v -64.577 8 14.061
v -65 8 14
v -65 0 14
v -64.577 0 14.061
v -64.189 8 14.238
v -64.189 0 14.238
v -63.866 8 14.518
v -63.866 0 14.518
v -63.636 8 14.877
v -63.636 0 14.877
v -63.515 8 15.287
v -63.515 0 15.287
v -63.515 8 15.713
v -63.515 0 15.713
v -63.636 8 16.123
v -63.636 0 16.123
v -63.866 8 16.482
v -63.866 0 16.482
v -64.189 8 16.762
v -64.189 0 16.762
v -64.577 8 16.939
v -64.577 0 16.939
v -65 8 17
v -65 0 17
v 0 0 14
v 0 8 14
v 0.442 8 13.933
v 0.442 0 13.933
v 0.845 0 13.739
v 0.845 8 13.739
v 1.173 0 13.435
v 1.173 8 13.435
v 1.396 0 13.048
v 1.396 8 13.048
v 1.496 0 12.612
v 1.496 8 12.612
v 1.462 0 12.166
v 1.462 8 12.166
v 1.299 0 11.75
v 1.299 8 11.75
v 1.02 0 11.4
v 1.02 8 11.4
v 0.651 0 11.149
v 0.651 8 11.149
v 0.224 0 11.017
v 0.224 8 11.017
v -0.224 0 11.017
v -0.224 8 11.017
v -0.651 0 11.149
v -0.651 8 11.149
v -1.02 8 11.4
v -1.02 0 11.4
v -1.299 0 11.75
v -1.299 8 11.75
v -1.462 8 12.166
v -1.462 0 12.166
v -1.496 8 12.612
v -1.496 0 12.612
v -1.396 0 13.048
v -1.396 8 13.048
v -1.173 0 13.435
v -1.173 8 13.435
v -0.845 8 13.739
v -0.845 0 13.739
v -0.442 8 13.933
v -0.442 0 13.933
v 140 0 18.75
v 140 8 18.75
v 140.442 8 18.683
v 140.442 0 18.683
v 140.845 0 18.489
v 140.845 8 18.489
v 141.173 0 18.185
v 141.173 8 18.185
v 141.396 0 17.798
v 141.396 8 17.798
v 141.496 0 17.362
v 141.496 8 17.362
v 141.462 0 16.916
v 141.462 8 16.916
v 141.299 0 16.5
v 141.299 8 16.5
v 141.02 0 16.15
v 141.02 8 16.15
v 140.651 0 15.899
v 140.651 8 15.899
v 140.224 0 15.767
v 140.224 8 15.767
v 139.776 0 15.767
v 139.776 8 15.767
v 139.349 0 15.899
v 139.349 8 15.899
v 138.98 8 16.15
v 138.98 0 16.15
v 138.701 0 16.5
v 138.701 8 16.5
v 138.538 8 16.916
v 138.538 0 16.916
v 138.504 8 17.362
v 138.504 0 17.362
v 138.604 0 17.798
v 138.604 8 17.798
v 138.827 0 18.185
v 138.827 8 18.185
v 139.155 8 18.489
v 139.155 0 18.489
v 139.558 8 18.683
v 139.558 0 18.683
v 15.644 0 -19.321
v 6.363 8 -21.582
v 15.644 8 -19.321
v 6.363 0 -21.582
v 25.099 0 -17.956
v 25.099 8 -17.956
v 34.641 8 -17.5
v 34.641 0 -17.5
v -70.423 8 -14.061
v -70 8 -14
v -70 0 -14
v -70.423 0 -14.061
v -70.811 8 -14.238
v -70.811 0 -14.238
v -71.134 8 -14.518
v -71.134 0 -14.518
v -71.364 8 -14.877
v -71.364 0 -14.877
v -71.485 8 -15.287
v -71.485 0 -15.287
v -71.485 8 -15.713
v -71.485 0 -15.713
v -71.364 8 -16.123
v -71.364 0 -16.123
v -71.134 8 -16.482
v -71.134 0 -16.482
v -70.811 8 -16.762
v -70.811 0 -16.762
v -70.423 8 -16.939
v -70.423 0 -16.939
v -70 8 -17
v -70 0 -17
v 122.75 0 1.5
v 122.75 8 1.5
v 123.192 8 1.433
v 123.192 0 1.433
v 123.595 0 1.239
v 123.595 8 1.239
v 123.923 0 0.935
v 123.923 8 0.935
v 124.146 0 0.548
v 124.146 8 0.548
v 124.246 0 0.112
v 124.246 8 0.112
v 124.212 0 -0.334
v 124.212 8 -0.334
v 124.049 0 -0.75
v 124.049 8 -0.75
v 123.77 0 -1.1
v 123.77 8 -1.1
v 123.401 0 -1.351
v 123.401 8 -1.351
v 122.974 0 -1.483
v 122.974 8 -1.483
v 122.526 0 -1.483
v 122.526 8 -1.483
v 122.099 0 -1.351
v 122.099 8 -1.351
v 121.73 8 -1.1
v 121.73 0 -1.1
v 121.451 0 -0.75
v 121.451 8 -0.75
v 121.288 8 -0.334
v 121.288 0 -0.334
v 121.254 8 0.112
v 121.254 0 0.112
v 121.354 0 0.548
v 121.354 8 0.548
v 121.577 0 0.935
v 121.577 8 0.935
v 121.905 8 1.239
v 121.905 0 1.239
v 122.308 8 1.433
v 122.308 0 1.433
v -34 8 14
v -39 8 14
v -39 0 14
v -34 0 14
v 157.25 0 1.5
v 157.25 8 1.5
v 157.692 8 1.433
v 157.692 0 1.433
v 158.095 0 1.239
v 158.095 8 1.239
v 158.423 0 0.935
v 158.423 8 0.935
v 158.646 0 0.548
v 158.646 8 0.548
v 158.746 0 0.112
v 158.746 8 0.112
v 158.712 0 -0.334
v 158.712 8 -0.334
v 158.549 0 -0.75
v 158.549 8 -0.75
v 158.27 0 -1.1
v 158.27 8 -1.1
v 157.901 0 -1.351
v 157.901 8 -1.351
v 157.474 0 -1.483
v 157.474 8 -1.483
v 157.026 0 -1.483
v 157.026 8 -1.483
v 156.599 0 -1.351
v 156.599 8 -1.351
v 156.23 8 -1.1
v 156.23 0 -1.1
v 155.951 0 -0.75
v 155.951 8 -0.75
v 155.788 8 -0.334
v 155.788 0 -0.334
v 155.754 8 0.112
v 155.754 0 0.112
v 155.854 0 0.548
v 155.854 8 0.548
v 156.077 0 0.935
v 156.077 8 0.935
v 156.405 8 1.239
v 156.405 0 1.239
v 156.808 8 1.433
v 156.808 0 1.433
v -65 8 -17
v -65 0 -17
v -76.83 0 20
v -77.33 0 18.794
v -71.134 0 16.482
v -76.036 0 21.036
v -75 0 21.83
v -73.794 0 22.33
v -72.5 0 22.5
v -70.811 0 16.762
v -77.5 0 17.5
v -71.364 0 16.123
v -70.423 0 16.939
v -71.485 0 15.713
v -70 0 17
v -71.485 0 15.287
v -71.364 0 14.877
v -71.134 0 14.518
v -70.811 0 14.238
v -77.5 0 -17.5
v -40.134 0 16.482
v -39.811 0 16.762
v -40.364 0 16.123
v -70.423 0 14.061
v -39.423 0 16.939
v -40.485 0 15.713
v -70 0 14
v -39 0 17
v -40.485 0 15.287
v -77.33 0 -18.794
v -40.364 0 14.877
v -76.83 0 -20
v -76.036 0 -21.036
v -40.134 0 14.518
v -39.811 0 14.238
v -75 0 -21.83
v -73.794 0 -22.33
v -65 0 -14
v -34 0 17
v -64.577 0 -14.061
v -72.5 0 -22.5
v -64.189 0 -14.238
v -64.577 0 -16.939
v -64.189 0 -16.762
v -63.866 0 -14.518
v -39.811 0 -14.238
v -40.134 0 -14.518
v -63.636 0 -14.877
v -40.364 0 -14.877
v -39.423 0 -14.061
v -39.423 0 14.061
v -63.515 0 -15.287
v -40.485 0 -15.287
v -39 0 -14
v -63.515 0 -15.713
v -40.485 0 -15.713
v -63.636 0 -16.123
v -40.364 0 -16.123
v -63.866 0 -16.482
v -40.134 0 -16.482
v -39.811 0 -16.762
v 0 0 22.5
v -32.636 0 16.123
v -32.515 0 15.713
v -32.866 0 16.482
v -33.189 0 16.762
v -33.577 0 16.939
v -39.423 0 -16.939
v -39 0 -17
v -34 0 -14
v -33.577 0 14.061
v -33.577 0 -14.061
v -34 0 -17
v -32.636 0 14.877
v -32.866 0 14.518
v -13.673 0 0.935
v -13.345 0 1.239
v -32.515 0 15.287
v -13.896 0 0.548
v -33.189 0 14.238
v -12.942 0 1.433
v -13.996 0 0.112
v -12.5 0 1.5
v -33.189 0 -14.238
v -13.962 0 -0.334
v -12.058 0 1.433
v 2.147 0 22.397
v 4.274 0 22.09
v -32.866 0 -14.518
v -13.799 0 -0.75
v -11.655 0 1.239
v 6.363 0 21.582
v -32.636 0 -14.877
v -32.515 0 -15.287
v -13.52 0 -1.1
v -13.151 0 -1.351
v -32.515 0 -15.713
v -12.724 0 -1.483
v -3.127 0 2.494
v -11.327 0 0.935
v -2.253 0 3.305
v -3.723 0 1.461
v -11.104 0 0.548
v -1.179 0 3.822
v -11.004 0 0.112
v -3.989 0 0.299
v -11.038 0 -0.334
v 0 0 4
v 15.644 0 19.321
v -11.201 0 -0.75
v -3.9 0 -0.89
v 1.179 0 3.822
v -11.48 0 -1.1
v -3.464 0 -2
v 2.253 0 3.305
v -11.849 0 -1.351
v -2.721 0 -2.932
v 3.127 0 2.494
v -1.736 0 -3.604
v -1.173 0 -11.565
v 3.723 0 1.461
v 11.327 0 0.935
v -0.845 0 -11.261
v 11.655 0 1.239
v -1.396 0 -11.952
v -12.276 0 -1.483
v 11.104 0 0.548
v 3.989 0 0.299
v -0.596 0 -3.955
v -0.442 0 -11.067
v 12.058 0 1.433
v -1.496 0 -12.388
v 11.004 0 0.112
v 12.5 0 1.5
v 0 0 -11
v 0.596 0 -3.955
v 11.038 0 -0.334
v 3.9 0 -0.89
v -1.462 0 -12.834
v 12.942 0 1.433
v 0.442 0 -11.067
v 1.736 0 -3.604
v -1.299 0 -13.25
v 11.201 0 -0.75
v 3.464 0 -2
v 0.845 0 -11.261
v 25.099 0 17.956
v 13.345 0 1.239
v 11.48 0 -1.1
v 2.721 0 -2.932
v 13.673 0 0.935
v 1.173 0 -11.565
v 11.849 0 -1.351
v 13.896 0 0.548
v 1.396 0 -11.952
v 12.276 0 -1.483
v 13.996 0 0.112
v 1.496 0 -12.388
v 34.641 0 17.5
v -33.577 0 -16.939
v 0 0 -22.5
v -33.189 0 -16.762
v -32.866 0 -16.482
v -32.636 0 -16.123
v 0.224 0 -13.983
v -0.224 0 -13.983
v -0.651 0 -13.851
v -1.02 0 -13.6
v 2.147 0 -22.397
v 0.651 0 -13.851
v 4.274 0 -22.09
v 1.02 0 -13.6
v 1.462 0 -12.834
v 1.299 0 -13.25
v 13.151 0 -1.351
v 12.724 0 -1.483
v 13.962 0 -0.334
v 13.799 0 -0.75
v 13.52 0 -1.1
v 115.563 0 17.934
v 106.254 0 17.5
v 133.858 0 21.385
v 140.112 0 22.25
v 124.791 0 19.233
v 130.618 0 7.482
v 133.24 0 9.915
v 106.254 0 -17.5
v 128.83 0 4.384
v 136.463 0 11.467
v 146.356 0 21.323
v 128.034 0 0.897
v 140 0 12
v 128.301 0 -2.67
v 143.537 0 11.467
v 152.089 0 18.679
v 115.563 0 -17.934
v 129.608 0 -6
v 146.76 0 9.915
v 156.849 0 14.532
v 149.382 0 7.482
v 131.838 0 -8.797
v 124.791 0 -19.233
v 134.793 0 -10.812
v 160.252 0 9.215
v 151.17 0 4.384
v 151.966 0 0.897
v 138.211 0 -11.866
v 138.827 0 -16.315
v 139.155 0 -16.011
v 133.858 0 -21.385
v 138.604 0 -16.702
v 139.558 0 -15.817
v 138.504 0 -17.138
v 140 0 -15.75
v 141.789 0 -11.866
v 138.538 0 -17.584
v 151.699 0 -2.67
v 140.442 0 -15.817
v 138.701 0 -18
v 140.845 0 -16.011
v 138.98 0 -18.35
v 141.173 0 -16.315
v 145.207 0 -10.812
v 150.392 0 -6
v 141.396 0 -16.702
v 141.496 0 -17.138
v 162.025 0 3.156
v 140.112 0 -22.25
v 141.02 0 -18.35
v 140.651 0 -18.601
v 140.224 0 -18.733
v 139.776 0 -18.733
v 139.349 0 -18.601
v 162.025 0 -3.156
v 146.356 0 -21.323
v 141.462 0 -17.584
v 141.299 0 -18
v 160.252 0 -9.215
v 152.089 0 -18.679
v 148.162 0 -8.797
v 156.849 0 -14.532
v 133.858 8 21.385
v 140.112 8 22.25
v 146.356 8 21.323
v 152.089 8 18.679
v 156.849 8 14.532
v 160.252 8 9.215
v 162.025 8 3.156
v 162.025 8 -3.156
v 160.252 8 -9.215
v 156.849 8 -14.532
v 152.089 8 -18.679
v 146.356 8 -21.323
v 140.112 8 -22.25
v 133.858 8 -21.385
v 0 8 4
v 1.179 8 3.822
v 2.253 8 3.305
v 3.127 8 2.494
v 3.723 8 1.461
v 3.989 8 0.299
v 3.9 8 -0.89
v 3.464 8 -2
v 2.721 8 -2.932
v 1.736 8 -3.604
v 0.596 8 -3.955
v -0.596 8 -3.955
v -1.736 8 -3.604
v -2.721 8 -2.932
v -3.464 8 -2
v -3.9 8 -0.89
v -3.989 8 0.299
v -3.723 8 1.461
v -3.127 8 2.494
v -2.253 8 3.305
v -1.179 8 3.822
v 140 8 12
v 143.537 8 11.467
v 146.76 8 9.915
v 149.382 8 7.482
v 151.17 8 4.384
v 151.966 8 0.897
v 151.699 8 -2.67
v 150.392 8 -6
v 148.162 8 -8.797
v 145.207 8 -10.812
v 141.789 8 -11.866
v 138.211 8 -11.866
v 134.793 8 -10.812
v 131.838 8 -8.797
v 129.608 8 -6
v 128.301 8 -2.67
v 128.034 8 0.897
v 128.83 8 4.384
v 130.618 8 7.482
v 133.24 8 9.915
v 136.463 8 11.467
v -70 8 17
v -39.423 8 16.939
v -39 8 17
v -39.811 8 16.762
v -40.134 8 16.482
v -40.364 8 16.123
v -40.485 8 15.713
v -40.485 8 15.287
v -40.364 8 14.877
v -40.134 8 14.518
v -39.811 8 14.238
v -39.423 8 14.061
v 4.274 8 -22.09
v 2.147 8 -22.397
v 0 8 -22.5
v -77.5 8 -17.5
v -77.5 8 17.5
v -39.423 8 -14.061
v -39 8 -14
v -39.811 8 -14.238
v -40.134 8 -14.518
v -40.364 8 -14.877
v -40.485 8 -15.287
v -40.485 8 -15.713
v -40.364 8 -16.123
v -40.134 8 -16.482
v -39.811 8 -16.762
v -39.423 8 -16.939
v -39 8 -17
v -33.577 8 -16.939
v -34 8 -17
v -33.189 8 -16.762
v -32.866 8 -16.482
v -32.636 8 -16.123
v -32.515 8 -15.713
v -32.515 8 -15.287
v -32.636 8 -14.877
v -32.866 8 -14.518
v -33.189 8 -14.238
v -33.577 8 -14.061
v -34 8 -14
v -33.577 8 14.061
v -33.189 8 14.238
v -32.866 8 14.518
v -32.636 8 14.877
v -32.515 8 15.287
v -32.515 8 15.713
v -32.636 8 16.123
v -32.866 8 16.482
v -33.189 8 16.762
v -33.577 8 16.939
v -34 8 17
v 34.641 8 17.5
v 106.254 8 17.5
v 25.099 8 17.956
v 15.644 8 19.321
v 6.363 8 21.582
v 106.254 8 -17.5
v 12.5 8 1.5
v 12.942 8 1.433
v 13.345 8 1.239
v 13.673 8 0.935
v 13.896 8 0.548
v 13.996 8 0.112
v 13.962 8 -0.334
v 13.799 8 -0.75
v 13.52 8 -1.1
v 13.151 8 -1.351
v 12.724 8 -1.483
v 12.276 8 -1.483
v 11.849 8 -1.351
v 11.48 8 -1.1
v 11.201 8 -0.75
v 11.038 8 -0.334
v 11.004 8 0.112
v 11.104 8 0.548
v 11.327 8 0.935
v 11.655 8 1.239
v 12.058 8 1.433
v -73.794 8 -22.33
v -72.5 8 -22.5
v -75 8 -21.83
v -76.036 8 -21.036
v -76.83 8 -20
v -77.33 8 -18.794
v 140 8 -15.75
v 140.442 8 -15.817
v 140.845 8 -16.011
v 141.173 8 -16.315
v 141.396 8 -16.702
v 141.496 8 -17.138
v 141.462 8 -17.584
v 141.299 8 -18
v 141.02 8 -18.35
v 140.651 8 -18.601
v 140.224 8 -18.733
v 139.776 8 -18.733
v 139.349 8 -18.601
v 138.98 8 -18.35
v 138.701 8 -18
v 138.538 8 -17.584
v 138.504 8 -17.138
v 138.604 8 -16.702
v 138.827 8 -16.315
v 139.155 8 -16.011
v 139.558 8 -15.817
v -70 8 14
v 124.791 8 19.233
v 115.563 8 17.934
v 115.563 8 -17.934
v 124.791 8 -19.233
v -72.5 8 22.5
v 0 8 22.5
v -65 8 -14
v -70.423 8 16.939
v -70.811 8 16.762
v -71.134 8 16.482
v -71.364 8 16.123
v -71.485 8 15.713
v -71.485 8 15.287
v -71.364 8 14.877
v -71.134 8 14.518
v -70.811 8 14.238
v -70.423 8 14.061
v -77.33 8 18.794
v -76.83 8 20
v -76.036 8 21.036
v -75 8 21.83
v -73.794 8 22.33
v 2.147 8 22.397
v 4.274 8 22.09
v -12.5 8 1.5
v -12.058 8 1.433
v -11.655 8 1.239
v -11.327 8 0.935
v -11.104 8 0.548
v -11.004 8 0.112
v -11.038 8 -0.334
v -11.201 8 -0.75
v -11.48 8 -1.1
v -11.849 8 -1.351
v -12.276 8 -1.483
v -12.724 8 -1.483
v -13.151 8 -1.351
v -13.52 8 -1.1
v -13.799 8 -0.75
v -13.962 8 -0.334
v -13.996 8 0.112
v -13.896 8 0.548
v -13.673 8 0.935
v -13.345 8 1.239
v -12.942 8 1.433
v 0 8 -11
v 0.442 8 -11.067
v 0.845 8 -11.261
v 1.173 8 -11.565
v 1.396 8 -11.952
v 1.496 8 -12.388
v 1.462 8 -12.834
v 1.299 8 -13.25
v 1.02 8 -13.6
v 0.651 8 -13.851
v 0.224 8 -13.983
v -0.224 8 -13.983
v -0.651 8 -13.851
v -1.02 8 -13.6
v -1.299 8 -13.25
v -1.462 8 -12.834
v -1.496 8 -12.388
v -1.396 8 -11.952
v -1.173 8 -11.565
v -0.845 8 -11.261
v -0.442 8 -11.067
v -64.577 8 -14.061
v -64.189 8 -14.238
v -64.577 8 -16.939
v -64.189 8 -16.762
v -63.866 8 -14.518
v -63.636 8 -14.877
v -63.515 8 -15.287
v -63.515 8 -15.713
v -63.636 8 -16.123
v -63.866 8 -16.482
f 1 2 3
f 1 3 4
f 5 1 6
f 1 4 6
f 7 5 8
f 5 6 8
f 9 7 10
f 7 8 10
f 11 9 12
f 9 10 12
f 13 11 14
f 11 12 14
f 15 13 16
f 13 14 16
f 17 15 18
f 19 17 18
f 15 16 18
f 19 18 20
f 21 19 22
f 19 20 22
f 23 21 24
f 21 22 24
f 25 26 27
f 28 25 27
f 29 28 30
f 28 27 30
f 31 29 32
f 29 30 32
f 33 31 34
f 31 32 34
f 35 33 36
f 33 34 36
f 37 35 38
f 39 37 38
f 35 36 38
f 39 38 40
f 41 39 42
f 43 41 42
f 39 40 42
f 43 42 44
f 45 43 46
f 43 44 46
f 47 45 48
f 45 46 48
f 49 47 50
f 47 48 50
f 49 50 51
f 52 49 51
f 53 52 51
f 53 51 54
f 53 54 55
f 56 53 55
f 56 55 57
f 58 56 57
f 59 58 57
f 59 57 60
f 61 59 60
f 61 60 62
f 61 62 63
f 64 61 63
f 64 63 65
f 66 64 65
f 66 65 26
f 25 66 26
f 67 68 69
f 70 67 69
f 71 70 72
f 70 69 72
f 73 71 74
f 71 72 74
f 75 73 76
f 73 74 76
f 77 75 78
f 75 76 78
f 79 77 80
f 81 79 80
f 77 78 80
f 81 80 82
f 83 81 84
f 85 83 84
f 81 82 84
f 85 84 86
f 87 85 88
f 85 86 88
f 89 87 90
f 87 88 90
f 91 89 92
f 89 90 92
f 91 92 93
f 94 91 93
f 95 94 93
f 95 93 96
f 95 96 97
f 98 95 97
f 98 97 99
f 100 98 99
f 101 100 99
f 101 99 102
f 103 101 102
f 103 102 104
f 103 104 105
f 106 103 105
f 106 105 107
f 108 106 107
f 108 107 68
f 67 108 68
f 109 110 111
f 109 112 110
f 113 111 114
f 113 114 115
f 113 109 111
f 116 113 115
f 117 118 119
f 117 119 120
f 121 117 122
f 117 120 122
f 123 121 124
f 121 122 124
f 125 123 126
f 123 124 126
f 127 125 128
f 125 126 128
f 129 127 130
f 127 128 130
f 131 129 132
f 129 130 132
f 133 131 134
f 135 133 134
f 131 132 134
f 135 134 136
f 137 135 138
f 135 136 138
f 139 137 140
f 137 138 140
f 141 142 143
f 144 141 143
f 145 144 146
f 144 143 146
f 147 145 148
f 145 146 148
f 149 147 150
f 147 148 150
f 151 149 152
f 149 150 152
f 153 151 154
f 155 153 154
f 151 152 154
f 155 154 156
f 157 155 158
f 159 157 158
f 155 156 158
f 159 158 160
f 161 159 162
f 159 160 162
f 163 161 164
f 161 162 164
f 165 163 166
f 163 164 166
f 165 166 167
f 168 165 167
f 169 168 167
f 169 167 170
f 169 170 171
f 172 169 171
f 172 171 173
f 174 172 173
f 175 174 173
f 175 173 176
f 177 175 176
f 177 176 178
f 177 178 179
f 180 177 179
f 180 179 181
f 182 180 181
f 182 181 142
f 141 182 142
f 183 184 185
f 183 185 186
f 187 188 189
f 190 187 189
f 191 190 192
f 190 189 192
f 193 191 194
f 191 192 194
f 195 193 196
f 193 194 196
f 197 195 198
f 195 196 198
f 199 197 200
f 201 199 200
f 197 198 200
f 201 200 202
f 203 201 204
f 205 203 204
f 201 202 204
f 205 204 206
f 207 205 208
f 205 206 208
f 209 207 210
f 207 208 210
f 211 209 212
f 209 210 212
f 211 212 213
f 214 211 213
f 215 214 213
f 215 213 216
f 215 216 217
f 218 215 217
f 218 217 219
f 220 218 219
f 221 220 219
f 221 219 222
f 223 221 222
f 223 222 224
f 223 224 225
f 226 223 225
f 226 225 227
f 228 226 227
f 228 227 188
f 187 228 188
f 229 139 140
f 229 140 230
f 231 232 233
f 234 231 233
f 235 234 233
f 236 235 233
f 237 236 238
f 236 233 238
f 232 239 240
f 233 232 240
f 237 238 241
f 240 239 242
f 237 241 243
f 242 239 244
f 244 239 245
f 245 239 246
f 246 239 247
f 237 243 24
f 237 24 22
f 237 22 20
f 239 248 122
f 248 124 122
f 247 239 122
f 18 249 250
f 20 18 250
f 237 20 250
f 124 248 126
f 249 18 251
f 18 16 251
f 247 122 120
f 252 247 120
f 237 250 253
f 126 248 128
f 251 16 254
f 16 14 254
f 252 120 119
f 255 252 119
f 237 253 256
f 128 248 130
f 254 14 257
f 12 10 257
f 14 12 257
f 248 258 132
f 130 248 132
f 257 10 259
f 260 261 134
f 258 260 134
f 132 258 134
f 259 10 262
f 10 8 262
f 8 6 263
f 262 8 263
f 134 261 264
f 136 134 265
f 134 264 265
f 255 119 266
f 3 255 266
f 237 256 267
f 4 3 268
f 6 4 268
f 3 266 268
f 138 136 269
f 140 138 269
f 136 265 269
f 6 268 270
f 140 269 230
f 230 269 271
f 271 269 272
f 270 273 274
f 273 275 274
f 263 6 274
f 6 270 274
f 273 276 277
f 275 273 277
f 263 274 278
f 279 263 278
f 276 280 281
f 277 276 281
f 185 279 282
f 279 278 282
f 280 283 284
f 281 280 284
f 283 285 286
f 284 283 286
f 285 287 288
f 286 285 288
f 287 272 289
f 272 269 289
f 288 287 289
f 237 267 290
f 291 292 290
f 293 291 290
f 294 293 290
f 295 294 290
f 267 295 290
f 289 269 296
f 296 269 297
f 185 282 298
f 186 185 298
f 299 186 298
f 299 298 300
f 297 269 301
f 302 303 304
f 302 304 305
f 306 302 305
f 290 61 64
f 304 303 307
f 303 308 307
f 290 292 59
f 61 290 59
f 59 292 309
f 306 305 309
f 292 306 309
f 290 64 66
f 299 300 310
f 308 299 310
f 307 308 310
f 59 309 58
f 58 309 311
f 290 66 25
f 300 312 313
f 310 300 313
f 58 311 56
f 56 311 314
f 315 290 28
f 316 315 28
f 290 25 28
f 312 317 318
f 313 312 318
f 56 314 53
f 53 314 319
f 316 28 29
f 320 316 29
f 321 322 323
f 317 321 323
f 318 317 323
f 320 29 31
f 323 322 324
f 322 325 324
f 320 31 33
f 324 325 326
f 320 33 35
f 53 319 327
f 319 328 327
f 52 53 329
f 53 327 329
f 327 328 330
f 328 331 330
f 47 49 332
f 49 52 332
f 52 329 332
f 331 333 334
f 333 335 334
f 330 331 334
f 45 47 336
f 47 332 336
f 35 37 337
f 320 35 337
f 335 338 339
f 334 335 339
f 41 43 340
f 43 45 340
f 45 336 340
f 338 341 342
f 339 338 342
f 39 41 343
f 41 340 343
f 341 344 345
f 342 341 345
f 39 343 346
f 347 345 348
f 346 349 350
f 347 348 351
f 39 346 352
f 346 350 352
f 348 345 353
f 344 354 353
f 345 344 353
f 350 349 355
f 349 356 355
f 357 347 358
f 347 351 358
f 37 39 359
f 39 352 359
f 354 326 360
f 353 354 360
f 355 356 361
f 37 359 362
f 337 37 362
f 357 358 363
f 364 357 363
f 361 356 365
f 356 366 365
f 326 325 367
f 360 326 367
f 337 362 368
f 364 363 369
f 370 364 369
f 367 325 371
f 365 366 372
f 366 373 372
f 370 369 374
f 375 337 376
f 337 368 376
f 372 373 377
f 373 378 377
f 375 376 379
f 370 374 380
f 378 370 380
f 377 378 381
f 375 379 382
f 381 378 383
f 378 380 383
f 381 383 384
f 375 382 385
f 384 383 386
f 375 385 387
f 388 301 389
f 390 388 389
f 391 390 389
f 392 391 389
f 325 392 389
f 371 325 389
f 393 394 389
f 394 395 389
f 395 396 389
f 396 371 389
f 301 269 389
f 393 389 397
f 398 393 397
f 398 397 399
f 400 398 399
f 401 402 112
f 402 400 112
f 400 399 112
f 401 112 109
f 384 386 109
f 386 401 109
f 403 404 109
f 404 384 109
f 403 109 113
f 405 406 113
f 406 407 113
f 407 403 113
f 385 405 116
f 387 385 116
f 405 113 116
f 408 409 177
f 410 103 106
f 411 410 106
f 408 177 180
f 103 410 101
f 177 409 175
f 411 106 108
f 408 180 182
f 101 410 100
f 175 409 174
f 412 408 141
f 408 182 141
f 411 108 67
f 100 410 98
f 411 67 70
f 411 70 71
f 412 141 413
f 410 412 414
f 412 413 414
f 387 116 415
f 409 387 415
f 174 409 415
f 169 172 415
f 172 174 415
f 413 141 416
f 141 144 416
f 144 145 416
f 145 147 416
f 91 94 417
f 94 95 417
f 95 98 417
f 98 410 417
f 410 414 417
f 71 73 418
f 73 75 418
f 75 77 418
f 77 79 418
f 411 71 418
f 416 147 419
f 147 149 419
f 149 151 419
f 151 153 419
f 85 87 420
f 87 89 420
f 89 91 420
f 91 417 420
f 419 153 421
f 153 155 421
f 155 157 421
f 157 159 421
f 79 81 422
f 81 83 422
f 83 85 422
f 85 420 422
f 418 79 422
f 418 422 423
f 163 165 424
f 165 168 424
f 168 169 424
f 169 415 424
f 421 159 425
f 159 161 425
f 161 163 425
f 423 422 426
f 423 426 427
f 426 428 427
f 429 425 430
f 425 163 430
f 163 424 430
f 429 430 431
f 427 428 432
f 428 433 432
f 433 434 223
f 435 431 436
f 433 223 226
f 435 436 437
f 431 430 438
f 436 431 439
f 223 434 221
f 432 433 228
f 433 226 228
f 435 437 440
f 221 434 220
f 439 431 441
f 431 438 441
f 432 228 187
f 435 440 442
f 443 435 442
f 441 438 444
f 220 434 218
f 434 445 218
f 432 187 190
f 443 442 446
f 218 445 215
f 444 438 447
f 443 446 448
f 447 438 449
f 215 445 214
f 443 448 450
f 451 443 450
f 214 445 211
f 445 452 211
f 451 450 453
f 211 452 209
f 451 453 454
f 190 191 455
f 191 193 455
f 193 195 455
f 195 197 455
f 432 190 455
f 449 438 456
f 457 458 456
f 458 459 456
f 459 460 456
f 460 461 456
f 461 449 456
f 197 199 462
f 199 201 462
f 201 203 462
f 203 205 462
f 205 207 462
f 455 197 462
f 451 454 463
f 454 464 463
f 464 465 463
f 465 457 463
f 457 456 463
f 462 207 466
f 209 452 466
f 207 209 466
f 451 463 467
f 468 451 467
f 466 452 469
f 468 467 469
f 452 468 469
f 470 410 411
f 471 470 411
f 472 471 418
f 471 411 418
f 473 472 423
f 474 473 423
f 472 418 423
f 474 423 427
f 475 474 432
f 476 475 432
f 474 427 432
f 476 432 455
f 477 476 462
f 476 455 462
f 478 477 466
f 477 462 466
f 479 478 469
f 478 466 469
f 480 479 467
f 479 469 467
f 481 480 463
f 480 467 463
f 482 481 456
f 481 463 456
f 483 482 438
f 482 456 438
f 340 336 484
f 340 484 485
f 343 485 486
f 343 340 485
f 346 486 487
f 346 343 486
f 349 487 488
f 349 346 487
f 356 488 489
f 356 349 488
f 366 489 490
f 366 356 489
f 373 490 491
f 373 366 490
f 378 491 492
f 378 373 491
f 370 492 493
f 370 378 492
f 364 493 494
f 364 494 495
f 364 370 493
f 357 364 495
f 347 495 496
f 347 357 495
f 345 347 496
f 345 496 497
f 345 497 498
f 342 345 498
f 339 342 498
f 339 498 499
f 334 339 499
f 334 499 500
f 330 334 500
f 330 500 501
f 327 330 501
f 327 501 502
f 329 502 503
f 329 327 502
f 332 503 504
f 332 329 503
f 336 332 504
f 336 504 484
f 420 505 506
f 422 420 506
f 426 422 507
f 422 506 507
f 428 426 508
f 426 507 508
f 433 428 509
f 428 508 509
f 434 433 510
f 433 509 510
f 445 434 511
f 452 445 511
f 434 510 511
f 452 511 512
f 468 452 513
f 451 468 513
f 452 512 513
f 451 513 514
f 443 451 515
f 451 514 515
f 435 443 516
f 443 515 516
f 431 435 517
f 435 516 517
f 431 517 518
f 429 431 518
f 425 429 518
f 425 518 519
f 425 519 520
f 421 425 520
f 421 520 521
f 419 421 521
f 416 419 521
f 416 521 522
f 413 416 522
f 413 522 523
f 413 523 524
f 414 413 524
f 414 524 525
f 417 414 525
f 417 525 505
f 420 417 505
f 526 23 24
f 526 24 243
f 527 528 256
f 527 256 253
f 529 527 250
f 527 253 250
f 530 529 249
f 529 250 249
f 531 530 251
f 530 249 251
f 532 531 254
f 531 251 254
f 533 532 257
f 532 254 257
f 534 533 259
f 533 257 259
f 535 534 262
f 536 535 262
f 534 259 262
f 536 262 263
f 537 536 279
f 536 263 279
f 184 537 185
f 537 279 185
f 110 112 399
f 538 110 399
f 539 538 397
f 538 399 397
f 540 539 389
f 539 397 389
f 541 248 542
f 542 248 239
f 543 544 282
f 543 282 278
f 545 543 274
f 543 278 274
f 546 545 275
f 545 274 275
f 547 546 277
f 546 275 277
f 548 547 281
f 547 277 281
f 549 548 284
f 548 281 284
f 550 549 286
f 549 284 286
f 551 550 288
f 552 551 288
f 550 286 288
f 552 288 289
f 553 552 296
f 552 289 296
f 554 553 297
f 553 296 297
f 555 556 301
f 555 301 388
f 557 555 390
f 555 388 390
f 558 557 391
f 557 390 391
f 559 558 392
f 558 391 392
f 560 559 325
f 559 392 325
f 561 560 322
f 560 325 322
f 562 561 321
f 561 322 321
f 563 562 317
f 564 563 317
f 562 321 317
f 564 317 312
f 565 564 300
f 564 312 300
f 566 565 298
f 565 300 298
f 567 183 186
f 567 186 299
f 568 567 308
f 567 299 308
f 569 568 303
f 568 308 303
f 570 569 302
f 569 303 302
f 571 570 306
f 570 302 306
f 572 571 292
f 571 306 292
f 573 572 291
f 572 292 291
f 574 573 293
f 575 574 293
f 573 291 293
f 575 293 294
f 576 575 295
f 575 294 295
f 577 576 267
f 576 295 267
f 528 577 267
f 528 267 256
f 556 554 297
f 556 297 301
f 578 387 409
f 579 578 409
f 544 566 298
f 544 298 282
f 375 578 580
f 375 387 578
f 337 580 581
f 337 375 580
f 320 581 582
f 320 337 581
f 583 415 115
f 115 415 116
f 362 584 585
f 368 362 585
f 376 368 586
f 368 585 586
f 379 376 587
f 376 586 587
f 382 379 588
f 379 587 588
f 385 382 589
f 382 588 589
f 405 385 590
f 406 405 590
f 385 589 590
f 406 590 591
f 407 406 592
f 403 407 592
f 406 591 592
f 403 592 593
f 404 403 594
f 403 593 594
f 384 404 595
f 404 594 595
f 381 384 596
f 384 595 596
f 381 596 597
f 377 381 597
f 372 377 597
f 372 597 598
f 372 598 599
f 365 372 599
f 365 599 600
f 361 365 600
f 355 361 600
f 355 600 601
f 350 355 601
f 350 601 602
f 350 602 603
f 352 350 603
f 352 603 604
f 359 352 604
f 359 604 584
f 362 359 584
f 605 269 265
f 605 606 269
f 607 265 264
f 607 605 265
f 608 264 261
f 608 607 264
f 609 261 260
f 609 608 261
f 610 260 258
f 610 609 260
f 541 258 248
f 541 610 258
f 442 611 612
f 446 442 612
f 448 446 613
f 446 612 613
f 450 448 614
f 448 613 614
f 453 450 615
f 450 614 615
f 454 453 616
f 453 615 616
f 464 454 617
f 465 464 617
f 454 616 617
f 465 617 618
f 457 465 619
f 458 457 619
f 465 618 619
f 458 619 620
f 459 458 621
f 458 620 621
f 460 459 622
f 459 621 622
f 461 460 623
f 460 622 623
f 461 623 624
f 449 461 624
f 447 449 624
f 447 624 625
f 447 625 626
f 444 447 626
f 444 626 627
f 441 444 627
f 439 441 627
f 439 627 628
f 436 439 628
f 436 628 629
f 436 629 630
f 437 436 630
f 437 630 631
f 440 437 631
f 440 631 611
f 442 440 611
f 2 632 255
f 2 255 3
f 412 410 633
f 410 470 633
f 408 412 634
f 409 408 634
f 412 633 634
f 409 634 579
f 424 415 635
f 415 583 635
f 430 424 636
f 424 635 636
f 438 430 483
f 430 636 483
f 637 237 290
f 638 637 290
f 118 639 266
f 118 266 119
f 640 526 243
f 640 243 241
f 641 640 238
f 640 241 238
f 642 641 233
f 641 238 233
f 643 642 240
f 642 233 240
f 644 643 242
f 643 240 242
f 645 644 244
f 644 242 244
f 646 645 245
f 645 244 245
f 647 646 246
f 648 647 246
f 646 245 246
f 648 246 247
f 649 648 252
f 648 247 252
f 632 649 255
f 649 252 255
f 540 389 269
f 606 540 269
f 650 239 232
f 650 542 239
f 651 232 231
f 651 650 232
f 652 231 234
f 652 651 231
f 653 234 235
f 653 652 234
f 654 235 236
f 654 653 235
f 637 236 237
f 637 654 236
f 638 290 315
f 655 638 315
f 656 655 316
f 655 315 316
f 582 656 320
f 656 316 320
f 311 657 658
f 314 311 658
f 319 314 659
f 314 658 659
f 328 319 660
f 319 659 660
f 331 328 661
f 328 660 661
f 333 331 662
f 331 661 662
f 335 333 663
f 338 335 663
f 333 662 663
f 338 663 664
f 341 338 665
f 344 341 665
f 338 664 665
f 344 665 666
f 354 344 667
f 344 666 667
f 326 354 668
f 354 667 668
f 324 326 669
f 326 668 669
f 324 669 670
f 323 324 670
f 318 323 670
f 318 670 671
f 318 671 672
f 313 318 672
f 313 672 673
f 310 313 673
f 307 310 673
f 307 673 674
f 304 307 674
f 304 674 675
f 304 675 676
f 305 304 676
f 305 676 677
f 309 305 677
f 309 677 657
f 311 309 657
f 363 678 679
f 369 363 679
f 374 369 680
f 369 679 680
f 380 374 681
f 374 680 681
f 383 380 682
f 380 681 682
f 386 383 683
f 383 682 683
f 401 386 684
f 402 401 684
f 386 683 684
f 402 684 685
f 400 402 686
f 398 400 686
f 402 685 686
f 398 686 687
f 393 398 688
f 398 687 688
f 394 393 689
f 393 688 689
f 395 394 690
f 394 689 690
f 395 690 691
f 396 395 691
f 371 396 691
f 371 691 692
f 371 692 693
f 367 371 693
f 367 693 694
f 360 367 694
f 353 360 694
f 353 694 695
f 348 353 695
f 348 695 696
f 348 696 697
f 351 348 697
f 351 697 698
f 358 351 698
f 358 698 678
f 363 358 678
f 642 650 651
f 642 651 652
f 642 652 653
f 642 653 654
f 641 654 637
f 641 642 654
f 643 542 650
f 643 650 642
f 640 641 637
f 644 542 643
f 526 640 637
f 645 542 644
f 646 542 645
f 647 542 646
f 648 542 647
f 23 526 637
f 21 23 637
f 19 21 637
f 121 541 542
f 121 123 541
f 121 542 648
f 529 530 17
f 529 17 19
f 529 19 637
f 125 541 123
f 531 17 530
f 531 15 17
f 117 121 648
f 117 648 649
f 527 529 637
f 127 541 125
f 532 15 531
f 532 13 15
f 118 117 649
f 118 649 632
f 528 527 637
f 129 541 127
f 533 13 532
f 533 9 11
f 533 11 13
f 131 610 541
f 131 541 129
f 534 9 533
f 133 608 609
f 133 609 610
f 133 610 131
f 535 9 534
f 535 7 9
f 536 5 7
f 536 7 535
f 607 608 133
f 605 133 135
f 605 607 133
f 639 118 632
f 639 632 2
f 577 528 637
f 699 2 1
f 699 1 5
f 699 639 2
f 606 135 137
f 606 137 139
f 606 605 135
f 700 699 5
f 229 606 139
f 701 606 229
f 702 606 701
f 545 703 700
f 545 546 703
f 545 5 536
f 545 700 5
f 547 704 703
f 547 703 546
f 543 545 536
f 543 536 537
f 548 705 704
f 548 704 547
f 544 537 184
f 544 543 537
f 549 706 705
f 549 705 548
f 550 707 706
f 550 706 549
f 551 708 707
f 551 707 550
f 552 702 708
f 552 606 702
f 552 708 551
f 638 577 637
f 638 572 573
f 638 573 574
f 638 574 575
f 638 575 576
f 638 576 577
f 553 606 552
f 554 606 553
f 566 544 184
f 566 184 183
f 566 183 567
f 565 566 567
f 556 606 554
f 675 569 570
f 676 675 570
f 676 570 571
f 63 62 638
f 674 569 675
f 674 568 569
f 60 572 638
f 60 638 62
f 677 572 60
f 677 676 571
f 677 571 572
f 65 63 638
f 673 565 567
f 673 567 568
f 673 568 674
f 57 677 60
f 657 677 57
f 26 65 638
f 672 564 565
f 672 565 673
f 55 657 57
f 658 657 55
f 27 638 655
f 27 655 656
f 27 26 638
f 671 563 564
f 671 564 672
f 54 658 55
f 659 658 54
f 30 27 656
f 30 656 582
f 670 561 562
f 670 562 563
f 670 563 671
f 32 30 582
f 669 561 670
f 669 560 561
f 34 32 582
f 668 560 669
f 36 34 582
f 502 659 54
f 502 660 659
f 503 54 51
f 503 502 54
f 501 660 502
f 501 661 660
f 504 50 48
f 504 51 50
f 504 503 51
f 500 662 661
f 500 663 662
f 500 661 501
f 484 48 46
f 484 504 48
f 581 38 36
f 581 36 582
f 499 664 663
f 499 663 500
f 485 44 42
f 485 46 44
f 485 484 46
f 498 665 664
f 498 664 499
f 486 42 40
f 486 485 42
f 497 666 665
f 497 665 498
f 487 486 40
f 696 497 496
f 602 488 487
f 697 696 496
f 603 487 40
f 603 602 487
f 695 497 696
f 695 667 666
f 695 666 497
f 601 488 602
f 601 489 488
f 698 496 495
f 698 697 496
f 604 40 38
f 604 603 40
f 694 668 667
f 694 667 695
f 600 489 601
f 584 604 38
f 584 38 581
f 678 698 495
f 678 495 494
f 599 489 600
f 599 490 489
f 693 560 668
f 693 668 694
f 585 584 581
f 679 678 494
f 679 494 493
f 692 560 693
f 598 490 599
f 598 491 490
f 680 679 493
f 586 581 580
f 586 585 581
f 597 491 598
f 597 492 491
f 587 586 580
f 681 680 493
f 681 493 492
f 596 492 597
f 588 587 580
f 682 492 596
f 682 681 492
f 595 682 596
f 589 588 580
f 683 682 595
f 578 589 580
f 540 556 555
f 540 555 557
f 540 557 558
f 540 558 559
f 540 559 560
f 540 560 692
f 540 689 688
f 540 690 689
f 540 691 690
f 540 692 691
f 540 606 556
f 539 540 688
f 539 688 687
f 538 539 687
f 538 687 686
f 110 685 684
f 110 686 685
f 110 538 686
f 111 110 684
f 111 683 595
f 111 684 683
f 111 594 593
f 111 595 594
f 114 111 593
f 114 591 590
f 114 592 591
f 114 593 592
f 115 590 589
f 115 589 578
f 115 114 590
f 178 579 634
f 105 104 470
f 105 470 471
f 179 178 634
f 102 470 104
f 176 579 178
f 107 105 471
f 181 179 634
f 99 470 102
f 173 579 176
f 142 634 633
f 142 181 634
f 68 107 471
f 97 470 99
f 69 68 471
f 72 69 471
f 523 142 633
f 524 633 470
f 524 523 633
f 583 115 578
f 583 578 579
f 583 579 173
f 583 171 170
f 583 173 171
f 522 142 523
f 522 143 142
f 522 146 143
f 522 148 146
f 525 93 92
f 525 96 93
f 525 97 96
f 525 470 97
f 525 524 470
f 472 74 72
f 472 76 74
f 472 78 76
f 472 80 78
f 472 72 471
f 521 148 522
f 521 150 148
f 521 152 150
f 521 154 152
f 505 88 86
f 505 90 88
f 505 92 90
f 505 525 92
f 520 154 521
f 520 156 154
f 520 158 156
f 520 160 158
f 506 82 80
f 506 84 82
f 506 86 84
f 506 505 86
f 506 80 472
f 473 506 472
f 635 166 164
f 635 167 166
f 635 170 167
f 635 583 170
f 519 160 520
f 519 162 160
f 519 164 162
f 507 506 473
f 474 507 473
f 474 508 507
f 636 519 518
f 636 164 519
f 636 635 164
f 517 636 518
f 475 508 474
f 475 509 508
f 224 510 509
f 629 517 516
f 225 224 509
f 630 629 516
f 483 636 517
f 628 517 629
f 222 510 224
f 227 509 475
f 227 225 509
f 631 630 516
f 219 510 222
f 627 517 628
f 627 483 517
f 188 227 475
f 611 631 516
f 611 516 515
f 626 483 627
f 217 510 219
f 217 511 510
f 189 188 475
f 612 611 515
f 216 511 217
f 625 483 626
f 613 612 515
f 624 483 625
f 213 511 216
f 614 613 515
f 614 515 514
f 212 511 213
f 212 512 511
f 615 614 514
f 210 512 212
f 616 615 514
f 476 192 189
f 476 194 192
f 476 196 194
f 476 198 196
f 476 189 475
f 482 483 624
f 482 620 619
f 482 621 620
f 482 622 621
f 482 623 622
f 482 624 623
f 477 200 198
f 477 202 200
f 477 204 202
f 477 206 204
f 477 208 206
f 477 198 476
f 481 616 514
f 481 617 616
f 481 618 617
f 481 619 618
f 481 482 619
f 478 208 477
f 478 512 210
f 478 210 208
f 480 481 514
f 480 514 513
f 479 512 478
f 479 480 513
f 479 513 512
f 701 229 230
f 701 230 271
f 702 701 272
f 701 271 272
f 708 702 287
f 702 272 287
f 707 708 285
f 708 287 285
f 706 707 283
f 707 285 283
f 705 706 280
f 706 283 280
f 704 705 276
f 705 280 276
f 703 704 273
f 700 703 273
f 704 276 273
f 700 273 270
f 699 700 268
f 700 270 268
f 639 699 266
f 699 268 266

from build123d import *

# Parameters (mm, degrees)
SKETCH1_R           = 4
BOSS_EXTRUDE1_DEPTH = 8
BOSS_EXTRUDE2_START = -8
SKETCH2_R           = 4
BOSS_EXTRUDE2_DEPTH = 8
FILLET1_R           = 5
SKETCH3_R           = 1.5
CUT_EXTRUDE1_DEPTH  = 19
SKETCH4_R           = 1.5
SKETCH4_R_2         = 12
CUT_EXTRUDE2_DEPTH  = 19
FILLET2_R           = 100


with BuildPart() as part:
    # Sketch1 → Boss-Extrude1 (new body)
    with BuildSketch(Plane(origin=(0, 0, 0), x_dir=(1, 0, 0), z_dir=(0, 1, 0))):
        with BuildLine():
            Line((0, -17.5), (126.259093916, -17.5))
            ThreePointArc((126.259093916, -17.5), (162.25, 0), (126.259093916, 17.5))
            Line((126.259093916, 17.5), (0, 17.5))
            ThreePointArc((0, 17.5), (-17.5, 0), (0, -17.5))
        make_face()
        with Locations(Location((140, 0, 0), (0, 0, 270))):
            Circle(SKETCH1_R, mode=Mode.SUBTRACT)
        with Locations(Location((0, 0, 0), (0, 0, 270))):
            Circle(SKETCH1_R, mode=Mode.SUBTRACT)
    extrude(amount=BOSS_EXTRUDE1_DEPTH)

    # Sketch2 → Boss-Extrude2 (add)
    with BuildSketch(Plane(origin=(0, 8, 0), x_dir=(1, 0, 0), z_dir=(0, 1, 0)).offset(BOSS_EXTRUDE2_START)):
        with BuildLine():
            Line((0, 22.5), (-77.5, 22.5))
            Line((-77.5, 22.5), (-77.5, -22.5))
            Line((-77.5, -22.5), (0, -22.5))
            ThreePointArc((0, -22.5), (22.5, 0), (0, 22.5))
        make_face()
        with BuildLine():
            ThreePointArc((-65, -14), (-63.5, -15.5), (-65, -17))
            Line((-65, -17), (-70, -17))
            ThreePointArc((-70, -17), (-71.5, -15.5), (-70, -14))
            Line((-70, -14), (-65, -14))
        make_face(mode=Mode.SUBTRACT)
        with BuildLine():
            Line((-39, -14), (-38, -14))
            Line((-38, -14), (-34, -14))
            ThreePointArc((-34, -14), (-32.5, -15.5), (-34, -17))
            Line((-34, -17), (-39, -17))
            ThreePointArc((-39, -17), (-40.5, -15.5), (-39, -14))
        make_face(mode=Mode.SUBTRACT)
        with BuildLine():
            ThreePointArc((-65, 17), (-63.5, 15.5), (-65, 14))
            Line((-65, 14), (-70, 14))
            ThreePointArc((-70, 14), (-71.5, 15.5), (-70, 17))
            Line((-70, 17), (-65, 17))
        make_face(mode=Mode.SUBTRACT)
        with BuildLine():
            ThreePointArc((-34, 17), (-32.5, 15.5), (-34, 14))
            Line((-34, 14), (-39, 14))
            ThreePointArc((-39, 14), (-40.5, 15.5), (-39, 17))
            Line((-39, 17), (-34, 17))
        make_face(mode=Mode.SUBTRACT)
        with Locations(Location((0, 0, 0), (0, 0, 270))):
            Circle(SKETCH2_R, mode=Mode.SUBTRACT)
    extrude(amount=BOSS_EXTRUDE2_DEPTH)

    # Fillet1
    fillet1_edges = [part.edges().sort_by_distance(p)[0] for p in [
        (-77.5, 4, -22.5),
        (-77.5, 4, 22.5),
    ]]
    fillet(fillet1_edges, radius=FILLET1_R)

    # Sketch3 → Cut-Extrude1 (cut)
    with BuildSketch(Plane(origin=(0, 8, 0), x_dir=(1, 0, 0), z_dir=(0, 1, 0))):
        with Locations(Location((0, 12.5, 0), (0, 0, 270))):
            Circle(SKETCH3_R)
        with Locations(Location((12.5, 0, 0), (0, 0, 270))):
            Circle(SKETCH3_R)
        with Locations(Location((0, -12.5, 0), (0, 0, 270))):
            Circle(SKETCH3_R)
        with Locations(Location((-12.5, 0, 0), (0, 0, 270))):
            Circle(SKETCH3_R)
    extrude(amount=-CUT_EXTRUDE1_DEPTH, mode=Mode.SUBTRACT)

    # Sketch4 → Cut-Extrude2 (cut)
    with BuildSketch(Plane(origin=(0, 8, 0), x_dir=(1, 0, 0), z_dir=(0, 1, 0))):
        with Locations(Location((157.25, 0, 0), (0, 0, 270))):
            Circle(SKETCH4_R)
        with Locations(Location((140, -17.25, 0), (0, 0, 270))):
            Circle(SKETCH4_R)
        with Locations(Location((122.75, 0, 0), (0, 0, 270))):
            Circle(SKETCH4_R)
        with Locations(Location((140, 17.25, 0), (0, 0, 270))):
            Circle(SKETCH4_R)
        with Locations(Location((140, 0, 0), (0, 0, 270))):
            Circle(SKETCH4_R_2)
    extrude(amount=-CUT_EXTRUDE2_DEPTH, mode=Mode.SUBTRACT)

    # Fillet2
    fillet2_edges = [part.edges().sort_by_distance(p)[0] for p in [
        (126.259093916, 4, -17.5),
        (126.259093916, 4, 17.5),
        (14.142135624, 4, -17.5),
        (14.142135624, 4, 17.5),
    ]]
    fillet(fillet2_edges, radius=FILLET2_R)


solid = part.part
